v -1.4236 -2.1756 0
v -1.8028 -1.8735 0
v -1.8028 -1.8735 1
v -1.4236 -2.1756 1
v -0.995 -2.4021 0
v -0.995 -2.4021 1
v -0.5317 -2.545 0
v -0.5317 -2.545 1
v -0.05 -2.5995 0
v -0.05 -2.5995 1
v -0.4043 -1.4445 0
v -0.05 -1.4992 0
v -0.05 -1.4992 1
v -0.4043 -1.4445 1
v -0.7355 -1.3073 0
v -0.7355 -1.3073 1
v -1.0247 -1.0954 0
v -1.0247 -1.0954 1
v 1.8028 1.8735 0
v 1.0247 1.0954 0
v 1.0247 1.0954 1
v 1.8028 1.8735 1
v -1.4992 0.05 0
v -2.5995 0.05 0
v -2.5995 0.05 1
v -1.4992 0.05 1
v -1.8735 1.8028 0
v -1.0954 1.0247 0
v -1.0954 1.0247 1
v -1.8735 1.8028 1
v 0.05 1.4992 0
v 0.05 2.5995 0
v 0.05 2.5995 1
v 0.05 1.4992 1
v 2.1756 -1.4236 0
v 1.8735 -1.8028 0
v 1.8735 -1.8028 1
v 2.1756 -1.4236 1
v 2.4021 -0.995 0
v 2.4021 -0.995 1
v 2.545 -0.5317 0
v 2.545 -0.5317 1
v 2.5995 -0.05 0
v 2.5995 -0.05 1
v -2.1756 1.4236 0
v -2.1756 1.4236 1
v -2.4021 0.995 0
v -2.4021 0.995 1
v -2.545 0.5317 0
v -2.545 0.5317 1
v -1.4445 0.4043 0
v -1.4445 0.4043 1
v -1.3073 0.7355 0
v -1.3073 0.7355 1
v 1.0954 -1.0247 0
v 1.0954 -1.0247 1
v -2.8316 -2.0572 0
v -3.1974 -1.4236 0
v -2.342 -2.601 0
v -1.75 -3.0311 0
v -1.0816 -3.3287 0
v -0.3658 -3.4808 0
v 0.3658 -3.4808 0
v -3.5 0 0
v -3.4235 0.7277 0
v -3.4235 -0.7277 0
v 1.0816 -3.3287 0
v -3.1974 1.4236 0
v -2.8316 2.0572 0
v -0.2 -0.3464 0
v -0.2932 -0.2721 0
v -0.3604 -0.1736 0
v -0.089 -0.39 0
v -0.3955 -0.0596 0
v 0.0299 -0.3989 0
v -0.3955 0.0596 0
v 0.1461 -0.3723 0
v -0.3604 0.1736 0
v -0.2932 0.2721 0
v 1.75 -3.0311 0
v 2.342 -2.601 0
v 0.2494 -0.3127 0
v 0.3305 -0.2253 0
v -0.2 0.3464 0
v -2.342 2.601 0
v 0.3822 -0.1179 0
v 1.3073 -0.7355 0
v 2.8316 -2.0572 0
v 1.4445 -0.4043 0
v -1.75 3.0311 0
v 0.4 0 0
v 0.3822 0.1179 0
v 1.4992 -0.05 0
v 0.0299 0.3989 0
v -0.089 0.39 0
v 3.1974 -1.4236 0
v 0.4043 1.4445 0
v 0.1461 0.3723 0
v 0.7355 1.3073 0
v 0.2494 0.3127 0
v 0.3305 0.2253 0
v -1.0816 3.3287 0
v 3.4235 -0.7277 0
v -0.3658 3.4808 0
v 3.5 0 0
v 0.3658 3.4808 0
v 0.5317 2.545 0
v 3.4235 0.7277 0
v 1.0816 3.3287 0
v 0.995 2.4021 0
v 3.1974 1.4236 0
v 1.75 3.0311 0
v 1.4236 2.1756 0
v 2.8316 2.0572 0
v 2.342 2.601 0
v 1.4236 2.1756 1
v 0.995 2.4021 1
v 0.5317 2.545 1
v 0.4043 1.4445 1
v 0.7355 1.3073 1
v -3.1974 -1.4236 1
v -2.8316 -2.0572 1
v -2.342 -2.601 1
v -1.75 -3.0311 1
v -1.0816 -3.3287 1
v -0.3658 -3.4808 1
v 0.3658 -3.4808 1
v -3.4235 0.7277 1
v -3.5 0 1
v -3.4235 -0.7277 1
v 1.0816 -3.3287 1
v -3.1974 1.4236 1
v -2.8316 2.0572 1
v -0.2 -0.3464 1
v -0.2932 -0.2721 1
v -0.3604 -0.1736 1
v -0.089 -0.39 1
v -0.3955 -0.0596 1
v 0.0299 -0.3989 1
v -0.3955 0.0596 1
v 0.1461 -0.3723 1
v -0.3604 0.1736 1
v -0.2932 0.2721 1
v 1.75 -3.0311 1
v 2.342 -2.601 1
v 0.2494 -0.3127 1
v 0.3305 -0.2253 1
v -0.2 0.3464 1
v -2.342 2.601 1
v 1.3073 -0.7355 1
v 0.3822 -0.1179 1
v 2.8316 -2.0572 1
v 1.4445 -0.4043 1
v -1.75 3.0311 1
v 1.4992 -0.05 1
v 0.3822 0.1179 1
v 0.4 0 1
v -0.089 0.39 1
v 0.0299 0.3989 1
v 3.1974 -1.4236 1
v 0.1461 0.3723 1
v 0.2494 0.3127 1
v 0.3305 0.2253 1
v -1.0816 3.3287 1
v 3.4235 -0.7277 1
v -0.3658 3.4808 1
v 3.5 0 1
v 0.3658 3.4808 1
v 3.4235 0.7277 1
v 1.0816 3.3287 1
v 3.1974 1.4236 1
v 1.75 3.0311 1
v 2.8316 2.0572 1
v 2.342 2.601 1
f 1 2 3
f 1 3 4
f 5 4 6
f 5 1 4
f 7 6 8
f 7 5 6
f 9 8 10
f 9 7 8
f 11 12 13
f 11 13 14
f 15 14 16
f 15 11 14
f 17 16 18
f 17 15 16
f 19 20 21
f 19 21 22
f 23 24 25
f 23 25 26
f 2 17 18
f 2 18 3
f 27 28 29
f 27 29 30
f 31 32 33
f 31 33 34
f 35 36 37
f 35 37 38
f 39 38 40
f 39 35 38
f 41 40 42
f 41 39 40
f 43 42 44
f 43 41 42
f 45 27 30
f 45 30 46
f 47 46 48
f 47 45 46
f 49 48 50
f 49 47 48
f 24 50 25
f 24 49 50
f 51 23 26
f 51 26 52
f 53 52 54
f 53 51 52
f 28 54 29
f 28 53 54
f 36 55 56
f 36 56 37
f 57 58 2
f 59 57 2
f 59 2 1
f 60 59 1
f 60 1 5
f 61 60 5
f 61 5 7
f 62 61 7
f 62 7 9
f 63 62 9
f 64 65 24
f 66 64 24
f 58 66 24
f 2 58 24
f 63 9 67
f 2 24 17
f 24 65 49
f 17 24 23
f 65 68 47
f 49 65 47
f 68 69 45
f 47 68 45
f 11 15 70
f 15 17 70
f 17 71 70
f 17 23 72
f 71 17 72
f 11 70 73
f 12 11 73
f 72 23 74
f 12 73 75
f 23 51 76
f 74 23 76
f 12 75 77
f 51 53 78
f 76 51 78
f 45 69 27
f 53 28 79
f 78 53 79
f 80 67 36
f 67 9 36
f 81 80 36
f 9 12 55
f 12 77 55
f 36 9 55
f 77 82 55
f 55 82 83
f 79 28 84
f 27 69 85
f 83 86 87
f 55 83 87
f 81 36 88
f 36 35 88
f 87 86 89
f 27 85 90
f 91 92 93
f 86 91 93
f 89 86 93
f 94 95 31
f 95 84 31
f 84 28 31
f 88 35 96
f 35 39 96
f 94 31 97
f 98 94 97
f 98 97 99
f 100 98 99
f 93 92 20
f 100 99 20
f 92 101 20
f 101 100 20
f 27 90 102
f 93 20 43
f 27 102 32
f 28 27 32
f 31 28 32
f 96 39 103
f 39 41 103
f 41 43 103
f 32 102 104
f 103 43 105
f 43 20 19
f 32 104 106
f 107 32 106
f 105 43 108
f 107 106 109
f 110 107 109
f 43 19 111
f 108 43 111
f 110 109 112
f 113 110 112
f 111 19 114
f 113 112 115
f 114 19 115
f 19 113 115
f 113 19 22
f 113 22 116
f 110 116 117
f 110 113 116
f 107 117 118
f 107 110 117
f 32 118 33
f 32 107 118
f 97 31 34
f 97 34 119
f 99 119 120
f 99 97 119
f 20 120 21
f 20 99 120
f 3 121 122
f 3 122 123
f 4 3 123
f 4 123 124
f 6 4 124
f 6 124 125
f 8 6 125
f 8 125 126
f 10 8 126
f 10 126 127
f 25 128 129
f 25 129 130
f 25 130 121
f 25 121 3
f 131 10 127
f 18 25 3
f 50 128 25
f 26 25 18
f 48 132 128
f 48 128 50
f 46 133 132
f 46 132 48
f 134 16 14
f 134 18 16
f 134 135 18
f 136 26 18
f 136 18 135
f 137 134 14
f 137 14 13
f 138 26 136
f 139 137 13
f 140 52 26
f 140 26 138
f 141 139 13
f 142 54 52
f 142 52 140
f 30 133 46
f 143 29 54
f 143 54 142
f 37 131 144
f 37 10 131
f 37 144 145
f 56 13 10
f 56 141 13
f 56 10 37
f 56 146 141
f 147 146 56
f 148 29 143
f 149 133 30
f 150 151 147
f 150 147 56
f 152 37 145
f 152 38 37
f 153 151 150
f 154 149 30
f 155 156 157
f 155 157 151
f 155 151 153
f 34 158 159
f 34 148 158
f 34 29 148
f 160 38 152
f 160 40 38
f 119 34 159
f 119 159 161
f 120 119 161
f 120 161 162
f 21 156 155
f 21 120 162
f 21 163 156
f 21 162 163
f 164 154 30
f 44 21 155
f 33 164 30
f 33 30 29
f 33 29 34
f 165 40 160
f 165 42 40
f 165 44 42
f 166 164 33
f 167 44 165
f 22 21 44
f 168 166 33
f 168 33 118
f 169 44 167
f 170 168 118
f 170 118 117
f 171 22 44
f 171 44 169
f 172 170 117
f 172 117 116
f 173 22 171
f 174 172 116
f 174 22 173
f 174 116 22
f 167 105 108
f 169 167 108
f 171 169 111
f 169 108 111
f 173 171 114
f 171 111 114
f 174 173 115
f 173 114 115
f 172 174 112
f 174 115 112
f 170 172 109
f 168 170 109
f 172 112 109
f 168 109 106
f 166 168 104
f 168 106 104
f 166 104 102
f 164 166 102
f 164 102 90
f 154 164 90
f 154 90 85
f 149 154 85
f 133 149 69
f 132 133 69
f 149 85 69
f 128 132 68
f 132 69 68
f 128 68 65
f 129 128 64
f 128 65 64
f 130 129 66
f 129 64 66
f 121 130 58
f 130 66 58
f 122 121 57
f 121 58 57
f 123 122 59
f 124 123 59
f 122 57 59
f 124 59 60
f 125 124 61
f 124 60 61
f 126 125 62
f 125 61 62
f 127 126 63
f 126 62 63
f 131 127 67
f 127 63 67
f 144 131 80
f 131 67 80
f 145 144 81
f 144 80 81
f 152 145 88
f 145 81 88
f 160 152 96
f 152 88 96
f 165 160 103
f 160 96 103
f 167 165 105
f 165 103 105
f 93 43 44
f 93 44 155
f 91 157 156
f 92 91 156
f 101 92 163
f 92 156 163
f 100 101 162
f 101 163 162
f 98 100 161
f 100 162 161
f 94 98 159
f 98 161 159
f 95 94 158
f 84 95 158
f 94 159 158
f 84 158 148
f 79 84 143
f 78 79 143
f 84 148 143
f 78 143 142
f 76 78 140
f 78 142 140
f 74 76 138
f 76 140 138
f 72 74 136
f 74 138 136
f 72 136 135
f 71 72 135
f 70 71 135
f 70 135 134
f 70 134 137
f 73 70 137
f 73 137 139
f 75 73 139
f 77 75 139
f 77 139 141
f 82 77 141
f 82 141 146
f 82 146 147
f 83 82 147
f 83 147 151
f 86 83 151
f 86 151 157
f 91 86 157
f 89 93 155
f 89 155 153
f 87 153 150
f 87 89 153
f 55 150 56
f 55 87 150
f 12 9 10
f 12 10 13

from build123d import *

# Parameters (mm, degrees)
SKETCH2_R           = 3.5
BOSS_EXTRUDE1_DEPTH = 1
SKETCH4_R           = 0.4
CUT_EXTRUDE2_DEPTH  = 6.049752469
CUT_EXTRUDE3_START  = -1
CUT_EXTRUDE3_DEPTH  = 1
CIRPATTERN1_COUNT   = 4


# Read off the part's stored shape, not the designer's step: Cut-Extrude3
with BuildPart() as part:
    # Sketch2 → Boss-Extrude1 (new body)
    with BuildSketch(Plane.XY):
        Circle(SKETCH2_R)
    extrude(amount=BOSS_EXTRUDE1_DEPTH)

    # Sketch4 → Cut-Extrude2 (cut, through all)
    with BuildSketch(Plane.XY.offset(1)):
        Circle(SKETCH4_R)
    extrude(amount=-CUT_EXTRUDE2_DEPTH, mode=Mode.SUBTRACT)

    # Cut-Extrude3 outline → Cut-Extrude3 (cut)
    with BuildSketch(Plane.XY.offset(1).offset(CUT_EXTRUDE3_START)):
        with BuildLine():
            ThreePointArc((-0.05, -1.499166435), (-0.574025148, -1.385819299), (-1.024715413, -1.095426092))
            Line((-1.024715413, -1.095426092), (-1.802782305, -1.873492984))
            ThreePointArc((-1.802782305, -1.873492984), (-0.994976924, -2.402086785), (-0.05, -2.599519186))
            Line((-0.05, -2.599519186), (-0.05, -1.499166435))
        make_face()
    cut_extrude3 = extrude(amount=CUT_EXTRUDE3_DEPTH, mode=Mode.SUBTRACT)

    # CirPattern1: Cut-Extrude3 ×4 about axis
    cirpattern1_axis = Axis((0, 0, 0), (0, 0, 1))
    for i in range(1, CIRPATTERN1_COUNT):
        add(cut_extrude3.rotate(cirpattern1_axis, i * 360 / CIRPATTERN1_COUNT), mode=Mode.SUBTRACT)


solid = part.part
